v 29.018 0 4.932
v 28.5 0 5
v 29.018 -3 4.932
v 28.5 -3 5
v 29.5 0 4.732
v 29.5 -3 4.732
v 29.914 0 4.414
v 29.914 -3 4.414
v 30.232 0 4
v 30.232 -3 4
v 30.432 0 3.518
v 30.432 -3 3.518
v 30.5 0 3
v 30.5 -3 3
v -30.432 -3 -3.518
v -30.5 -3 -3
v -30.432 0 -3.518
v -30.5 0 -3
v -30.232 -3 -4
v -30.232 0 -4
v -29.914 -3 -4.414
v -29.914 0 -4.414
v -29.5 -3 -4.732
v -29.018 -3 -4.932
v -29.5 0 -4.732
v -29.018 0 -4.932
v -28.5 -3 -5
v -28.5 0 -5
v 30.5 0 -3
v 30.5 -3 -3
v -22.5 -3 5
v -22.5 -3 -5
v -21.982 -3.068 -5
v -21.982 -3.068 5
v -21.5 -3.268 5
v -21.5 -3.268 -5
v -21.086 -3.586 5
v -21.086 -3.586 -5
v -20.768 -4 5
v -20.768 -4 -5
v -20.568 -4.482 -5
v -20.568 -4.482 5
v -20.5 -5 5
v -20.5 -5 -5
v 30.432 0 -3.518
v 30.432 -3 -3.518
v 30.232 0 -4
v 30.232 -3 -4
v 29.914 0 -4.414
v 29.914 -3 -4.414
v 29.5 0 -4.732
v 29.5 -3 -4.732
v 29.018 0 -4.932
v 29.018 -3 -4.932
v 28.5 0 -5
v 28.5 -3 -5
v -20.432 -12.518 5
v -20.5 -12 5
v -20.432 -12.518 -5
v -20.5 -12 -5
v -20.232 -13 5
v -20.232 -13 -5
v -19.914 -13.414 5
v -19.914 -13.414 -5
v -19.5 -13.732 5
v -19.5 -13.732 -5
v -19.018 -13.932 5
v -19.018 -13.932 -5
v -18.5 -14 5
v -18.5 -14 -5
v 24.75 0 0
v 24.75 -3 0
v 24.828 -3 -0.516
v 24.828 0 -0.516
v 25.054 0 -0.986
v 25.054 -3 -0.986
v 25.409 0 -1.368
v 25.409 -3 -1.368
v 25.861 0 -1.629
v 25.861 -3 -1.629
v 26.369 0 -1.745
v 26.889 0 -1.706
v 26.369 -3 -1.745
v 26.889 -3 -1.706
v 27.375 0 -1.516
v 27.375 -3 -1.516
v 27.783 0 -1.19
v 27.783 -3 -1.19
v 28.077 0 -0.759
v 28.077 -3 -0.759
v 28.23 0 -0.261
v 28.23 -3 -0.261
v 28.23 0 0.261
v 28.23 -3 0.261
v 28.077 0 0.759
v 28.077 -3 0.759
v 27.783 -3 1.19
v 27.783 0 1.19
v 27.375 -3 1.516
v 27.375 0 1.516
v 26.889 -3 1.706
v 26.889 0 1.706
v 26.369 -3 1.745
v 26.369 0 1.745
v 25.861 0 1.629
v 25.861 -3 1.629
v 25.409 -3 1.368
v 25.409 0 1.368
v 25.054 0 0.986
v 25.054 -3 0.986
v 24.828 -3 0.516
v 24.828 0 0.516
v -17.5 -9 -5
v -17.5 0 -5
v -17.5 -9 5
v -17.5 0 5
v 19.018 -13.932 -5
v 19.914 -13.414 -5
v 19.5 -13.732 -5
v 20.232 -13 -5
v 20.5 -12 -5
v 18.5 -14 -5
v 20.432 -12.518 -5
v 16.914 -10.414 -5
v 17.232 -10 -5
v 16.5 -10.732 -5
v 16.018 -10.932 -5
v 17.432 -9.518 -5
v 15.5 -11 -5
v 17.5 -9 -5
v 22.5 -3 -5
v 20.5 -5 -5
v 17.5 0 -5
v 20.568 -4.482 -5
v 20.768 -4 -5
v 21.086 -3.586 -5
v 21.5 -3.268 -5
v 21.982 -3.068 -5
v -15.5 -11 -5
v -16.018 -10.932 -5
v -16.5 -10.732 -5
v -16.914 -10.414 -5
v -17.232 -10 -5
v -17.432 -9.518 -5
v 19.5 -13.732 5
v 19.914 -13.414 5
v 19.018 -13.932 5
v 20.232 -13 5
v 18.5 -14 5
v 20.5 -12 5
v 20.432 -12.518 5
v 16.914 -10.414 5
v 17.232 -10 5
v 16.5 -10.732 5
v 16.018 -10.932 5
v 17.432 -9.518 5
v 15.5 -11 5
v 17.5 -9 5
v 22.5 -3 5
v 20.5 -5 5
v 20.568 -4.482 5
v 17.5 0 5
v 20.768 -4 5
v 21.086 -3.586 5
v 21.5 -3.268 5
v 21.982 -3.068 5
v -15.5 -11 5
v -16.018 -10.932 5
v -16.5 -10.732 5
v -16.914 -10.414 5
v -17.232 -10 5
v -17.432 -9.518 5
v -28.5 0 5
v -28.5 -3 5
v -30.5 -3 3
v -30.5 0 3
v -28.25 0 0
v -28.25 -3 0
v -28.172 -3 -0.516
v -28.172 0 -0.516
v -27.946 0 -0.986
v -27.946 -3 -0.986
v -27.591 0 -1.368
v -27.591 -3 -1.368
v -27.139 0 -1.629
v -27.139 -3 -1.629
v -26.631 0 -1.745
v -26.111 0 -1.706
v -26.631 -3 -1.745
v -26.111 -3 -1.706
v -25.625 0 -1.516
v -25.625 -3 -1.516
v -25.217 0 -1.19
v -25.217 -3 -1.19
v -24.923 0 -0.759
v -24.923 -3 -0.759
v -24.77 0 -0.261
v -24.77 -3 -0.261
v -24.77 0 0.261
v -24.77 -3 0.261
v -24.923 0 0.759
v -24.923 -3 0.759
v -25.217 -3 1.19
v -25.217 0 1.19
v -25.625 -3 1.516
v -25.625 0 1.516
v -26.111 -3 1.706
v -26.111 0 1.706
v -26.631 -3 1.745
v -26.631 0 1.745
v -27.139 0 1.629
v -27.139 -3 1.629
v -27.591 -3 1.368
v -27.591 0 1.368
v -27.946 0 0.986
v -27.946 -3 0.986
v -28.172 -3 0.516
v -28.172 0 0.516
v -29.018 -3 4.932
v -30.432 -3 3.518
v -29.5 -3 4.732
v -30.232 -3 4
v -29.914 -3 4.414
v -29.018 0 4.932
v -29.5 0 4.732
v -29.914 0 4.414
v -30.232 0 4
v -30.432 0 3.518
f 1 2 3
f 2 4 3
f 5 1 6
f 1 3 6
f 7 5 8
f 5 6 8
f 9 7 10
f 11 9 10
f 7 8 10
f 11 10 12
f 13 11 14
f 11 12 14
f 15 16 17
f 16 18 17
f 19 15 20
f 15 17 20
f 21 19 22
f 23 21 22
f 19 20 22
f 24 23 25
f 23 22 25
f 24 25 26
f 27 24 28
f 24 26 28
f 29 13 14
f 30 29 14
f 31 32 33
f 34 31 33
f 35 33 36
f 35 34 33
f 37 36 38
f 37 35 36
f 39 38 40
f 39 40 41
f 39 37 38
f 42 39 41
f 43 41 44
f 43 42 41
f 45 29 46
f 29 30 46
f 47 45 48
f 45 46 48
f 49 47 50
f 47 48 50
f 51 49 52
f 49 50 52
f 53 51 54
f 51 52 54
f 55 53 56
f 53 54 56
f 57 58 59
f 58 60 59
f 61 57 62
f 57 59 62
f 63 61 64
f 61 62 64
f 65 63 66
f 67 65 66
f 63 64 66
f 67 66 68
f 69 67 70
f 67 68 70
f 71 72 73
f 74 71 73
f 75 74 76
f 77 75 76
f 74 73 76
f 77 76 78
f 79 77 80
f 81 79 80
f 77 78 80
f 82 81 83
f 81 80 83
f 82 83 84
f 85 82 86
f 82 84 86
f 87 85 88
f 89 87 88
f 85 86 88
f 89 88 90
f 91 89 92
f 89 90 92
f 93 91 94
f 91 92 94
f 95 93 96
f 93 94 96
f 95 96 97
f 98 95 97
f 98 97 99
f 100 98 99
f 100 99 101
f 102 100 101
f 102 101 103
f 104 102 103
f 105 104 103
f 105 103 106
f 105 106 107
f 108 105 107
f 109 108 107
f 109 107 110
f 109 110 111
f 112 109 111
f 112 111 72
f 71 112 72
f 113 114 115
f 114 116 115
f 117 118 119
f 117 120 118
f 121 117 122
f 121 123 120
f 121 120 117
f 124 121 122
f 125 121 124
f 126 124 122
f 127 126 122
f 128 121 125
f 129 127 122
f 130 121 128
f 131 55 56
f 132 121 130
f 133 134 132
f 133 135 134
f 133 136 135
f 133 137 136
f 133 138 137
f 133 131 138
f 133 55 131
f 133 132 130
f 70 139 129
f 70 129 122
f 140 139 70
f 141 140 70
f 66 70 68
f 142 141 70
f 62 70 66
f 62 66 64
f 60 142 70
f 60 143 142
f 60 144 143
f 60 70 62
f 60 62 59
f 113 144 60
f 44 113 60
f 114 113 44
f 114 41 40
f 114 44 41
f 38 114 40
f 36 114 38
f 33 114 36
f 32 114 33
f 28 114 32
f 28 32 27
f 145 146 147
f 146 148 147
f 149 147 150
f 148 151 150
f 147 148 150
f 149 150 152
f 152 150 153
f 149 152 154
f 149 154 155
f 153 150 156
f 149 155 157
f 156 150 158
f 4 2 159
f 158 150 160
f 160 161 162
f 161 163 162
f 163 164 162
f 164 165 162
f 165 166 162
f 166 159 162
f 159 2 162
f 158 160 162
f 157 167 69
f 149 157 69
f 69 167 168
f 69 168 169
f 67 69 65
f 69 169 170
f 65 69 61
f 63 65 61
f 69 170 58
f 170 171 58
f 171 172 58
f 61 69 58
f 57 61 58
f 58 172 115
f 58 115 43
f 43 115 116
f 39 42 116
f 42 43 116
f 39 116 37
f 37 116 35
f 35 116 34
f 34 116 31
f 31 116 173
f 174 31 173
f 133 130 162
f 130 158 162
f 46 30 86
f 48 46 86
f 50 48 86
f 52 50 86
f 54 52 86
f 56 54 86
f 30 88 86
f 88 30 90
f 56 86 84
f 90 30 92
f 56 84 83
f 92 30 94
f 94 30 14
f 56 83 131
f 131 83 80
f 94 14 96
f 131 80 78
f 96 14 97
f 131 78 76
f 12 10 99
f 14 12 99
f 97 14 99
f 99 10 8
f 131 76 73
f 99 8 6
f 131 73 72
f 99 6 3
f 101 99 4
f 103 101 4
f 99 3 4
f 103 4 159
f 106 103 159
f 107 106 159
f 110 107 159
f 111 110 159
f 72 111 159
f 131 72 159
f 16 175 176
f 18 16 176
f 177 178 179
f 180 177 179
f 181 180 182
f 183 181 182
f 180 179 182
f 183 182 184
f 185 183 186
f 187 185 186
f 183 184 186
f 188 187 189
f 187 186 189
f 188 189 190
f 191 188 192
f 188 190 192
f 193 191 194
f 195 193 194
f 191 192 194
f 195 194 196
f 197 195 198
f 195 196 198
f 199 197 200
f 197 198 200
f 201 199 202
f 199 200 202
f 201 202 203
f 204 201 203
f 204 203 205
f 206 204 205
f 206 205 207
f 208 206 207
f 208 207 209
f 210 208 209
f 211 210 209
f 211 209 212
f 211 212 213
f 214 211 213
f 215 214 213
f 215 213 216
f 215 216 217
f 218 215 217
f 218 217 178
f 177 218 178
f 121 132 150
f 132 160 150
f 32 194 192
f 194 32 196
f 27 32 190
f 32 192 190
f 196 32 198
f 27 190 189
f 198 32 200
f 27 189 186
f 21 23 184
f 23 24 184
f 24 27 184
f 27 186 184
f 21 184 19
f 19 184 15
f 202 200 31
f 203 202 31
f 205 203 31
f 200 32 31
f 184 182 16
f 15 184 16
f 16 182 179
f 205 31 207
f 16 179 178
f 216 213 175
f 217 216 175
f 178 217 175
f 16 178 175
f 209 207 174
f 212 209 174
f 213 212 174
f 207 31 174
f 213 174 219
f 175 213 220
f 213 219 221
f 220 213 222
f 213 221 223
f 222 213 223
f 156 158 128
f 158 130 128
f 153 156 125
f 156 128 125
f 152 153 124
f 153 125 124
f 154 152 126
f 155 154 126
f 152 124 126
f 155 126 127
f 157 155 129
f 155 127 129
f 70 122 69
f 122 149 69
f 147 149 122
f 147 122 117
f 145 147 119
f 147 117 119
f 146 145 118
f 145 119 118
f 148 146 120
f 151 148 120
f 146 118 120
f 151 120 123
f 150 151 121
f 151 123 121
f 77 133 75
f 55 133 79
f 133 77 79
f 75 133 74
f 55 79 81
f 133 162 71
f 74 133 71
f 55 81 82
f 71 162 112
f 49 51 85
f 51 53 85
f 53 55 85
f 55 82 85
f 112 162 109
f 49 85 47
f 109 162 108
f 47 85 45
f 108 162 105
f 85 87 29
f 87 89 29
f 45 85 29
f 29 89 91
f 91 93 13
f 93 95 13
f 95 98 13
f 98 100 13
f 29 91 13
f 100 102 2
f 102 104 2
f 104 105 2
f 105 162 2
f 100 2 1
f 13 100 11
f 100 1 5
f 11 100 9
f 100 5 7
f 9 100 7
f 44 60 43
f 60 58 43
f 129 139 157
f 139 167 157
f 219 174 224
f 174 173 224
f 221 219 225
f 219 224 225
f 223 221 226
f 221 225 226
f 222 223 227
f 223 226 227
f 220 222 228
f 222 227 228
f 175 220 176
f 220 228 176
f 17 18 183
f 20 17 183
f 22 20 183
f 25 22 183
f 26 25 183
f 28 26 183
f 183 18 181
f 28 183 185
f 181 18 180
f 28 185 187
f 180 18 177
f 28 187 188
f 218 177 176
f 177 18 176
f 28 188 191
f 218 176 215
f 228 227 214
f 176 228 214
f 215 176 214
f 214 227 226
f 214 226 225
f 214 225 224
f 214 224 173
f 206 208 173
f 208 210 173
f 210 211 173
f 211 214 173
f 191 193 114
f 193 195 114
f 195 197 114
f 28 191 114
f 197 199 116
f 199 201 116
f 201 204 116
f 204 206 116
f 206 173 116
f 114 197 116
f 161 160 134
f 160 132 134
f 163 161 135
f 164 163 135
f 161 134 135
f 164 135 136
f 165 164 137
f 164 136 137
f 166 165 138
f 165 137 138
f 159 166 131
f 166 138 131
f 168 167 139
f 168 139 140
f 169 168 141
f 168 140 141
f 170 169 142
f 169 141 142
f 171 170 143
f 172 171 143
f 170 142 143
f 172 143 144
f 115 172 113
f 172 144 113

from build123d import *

# Parameters (mm, degrees)
EXTRUDE_THIN1_DEPTH = 5
FILLET1_R           = 2
FILLET2_R           = 2
SKETCH2_R           = 1.75
CUT_EXTRUDE1_DEPTH  = 4


with BuildPart() as part:
    # Sketch1 → Extrude-Thin1 (new body, symmetric)
    with BuildSketch(Plane.XY):
        Polygon((-30.5, 0), (-17.5, 0), (-17.5, -11), (17.5, -11), (17.5, 0), (30.5, 0), (30.5, -3), (20.5, -3), (20.5, -14), (-20.5, -14), (-20.5, -3), (-30.5, -3), align=None)
    extrude(amount=EXTRUDE_THIN1_DEPTH, both=True)

    # Fillet1
    fillet1_edges = [part.edges().sort_by_distance(p)[0] for p in [
        (20.5, -3, 0),
        (20.5, -14, 0),
        (-20.5, -14, 0),
        (-20.5, -3, 0),
        (-17.5, -11, 0),
        (17.5, -11, 0),
    ]]
    fillet(fillet1_edges, radius=FILLET1_R)

    # Fillet2
    fillet2_edges = [part.edges().sort_by_distance(p)[0] for p in [
        (-30.5, -1.5, -5),
        (30.5, -1.5, -5),
        (-30.5, -1.5, 5),
        (30.5, -1.5, 5),
    ]]
    fillet(fillet2_edges, radius=FILLET2_R)

    # Sketch2 → Cut-Extrude1 (cut, through all)
    with BuildSketch(Plane(origin=(0, -3, 0), x_dir=(-1, 0, 0), z_dir=(0, -1, 0))):
        with Locations((-26.5, 0)):
            Circle(SKETCH2_R)
        with Locations((26.5, 0)):
            Circle(SKETCH2_R)
    extrude(amount=-CUT_EXTRUDE1_DEPTH, mode=Mode.SUBTRACT)


solid = part.part
